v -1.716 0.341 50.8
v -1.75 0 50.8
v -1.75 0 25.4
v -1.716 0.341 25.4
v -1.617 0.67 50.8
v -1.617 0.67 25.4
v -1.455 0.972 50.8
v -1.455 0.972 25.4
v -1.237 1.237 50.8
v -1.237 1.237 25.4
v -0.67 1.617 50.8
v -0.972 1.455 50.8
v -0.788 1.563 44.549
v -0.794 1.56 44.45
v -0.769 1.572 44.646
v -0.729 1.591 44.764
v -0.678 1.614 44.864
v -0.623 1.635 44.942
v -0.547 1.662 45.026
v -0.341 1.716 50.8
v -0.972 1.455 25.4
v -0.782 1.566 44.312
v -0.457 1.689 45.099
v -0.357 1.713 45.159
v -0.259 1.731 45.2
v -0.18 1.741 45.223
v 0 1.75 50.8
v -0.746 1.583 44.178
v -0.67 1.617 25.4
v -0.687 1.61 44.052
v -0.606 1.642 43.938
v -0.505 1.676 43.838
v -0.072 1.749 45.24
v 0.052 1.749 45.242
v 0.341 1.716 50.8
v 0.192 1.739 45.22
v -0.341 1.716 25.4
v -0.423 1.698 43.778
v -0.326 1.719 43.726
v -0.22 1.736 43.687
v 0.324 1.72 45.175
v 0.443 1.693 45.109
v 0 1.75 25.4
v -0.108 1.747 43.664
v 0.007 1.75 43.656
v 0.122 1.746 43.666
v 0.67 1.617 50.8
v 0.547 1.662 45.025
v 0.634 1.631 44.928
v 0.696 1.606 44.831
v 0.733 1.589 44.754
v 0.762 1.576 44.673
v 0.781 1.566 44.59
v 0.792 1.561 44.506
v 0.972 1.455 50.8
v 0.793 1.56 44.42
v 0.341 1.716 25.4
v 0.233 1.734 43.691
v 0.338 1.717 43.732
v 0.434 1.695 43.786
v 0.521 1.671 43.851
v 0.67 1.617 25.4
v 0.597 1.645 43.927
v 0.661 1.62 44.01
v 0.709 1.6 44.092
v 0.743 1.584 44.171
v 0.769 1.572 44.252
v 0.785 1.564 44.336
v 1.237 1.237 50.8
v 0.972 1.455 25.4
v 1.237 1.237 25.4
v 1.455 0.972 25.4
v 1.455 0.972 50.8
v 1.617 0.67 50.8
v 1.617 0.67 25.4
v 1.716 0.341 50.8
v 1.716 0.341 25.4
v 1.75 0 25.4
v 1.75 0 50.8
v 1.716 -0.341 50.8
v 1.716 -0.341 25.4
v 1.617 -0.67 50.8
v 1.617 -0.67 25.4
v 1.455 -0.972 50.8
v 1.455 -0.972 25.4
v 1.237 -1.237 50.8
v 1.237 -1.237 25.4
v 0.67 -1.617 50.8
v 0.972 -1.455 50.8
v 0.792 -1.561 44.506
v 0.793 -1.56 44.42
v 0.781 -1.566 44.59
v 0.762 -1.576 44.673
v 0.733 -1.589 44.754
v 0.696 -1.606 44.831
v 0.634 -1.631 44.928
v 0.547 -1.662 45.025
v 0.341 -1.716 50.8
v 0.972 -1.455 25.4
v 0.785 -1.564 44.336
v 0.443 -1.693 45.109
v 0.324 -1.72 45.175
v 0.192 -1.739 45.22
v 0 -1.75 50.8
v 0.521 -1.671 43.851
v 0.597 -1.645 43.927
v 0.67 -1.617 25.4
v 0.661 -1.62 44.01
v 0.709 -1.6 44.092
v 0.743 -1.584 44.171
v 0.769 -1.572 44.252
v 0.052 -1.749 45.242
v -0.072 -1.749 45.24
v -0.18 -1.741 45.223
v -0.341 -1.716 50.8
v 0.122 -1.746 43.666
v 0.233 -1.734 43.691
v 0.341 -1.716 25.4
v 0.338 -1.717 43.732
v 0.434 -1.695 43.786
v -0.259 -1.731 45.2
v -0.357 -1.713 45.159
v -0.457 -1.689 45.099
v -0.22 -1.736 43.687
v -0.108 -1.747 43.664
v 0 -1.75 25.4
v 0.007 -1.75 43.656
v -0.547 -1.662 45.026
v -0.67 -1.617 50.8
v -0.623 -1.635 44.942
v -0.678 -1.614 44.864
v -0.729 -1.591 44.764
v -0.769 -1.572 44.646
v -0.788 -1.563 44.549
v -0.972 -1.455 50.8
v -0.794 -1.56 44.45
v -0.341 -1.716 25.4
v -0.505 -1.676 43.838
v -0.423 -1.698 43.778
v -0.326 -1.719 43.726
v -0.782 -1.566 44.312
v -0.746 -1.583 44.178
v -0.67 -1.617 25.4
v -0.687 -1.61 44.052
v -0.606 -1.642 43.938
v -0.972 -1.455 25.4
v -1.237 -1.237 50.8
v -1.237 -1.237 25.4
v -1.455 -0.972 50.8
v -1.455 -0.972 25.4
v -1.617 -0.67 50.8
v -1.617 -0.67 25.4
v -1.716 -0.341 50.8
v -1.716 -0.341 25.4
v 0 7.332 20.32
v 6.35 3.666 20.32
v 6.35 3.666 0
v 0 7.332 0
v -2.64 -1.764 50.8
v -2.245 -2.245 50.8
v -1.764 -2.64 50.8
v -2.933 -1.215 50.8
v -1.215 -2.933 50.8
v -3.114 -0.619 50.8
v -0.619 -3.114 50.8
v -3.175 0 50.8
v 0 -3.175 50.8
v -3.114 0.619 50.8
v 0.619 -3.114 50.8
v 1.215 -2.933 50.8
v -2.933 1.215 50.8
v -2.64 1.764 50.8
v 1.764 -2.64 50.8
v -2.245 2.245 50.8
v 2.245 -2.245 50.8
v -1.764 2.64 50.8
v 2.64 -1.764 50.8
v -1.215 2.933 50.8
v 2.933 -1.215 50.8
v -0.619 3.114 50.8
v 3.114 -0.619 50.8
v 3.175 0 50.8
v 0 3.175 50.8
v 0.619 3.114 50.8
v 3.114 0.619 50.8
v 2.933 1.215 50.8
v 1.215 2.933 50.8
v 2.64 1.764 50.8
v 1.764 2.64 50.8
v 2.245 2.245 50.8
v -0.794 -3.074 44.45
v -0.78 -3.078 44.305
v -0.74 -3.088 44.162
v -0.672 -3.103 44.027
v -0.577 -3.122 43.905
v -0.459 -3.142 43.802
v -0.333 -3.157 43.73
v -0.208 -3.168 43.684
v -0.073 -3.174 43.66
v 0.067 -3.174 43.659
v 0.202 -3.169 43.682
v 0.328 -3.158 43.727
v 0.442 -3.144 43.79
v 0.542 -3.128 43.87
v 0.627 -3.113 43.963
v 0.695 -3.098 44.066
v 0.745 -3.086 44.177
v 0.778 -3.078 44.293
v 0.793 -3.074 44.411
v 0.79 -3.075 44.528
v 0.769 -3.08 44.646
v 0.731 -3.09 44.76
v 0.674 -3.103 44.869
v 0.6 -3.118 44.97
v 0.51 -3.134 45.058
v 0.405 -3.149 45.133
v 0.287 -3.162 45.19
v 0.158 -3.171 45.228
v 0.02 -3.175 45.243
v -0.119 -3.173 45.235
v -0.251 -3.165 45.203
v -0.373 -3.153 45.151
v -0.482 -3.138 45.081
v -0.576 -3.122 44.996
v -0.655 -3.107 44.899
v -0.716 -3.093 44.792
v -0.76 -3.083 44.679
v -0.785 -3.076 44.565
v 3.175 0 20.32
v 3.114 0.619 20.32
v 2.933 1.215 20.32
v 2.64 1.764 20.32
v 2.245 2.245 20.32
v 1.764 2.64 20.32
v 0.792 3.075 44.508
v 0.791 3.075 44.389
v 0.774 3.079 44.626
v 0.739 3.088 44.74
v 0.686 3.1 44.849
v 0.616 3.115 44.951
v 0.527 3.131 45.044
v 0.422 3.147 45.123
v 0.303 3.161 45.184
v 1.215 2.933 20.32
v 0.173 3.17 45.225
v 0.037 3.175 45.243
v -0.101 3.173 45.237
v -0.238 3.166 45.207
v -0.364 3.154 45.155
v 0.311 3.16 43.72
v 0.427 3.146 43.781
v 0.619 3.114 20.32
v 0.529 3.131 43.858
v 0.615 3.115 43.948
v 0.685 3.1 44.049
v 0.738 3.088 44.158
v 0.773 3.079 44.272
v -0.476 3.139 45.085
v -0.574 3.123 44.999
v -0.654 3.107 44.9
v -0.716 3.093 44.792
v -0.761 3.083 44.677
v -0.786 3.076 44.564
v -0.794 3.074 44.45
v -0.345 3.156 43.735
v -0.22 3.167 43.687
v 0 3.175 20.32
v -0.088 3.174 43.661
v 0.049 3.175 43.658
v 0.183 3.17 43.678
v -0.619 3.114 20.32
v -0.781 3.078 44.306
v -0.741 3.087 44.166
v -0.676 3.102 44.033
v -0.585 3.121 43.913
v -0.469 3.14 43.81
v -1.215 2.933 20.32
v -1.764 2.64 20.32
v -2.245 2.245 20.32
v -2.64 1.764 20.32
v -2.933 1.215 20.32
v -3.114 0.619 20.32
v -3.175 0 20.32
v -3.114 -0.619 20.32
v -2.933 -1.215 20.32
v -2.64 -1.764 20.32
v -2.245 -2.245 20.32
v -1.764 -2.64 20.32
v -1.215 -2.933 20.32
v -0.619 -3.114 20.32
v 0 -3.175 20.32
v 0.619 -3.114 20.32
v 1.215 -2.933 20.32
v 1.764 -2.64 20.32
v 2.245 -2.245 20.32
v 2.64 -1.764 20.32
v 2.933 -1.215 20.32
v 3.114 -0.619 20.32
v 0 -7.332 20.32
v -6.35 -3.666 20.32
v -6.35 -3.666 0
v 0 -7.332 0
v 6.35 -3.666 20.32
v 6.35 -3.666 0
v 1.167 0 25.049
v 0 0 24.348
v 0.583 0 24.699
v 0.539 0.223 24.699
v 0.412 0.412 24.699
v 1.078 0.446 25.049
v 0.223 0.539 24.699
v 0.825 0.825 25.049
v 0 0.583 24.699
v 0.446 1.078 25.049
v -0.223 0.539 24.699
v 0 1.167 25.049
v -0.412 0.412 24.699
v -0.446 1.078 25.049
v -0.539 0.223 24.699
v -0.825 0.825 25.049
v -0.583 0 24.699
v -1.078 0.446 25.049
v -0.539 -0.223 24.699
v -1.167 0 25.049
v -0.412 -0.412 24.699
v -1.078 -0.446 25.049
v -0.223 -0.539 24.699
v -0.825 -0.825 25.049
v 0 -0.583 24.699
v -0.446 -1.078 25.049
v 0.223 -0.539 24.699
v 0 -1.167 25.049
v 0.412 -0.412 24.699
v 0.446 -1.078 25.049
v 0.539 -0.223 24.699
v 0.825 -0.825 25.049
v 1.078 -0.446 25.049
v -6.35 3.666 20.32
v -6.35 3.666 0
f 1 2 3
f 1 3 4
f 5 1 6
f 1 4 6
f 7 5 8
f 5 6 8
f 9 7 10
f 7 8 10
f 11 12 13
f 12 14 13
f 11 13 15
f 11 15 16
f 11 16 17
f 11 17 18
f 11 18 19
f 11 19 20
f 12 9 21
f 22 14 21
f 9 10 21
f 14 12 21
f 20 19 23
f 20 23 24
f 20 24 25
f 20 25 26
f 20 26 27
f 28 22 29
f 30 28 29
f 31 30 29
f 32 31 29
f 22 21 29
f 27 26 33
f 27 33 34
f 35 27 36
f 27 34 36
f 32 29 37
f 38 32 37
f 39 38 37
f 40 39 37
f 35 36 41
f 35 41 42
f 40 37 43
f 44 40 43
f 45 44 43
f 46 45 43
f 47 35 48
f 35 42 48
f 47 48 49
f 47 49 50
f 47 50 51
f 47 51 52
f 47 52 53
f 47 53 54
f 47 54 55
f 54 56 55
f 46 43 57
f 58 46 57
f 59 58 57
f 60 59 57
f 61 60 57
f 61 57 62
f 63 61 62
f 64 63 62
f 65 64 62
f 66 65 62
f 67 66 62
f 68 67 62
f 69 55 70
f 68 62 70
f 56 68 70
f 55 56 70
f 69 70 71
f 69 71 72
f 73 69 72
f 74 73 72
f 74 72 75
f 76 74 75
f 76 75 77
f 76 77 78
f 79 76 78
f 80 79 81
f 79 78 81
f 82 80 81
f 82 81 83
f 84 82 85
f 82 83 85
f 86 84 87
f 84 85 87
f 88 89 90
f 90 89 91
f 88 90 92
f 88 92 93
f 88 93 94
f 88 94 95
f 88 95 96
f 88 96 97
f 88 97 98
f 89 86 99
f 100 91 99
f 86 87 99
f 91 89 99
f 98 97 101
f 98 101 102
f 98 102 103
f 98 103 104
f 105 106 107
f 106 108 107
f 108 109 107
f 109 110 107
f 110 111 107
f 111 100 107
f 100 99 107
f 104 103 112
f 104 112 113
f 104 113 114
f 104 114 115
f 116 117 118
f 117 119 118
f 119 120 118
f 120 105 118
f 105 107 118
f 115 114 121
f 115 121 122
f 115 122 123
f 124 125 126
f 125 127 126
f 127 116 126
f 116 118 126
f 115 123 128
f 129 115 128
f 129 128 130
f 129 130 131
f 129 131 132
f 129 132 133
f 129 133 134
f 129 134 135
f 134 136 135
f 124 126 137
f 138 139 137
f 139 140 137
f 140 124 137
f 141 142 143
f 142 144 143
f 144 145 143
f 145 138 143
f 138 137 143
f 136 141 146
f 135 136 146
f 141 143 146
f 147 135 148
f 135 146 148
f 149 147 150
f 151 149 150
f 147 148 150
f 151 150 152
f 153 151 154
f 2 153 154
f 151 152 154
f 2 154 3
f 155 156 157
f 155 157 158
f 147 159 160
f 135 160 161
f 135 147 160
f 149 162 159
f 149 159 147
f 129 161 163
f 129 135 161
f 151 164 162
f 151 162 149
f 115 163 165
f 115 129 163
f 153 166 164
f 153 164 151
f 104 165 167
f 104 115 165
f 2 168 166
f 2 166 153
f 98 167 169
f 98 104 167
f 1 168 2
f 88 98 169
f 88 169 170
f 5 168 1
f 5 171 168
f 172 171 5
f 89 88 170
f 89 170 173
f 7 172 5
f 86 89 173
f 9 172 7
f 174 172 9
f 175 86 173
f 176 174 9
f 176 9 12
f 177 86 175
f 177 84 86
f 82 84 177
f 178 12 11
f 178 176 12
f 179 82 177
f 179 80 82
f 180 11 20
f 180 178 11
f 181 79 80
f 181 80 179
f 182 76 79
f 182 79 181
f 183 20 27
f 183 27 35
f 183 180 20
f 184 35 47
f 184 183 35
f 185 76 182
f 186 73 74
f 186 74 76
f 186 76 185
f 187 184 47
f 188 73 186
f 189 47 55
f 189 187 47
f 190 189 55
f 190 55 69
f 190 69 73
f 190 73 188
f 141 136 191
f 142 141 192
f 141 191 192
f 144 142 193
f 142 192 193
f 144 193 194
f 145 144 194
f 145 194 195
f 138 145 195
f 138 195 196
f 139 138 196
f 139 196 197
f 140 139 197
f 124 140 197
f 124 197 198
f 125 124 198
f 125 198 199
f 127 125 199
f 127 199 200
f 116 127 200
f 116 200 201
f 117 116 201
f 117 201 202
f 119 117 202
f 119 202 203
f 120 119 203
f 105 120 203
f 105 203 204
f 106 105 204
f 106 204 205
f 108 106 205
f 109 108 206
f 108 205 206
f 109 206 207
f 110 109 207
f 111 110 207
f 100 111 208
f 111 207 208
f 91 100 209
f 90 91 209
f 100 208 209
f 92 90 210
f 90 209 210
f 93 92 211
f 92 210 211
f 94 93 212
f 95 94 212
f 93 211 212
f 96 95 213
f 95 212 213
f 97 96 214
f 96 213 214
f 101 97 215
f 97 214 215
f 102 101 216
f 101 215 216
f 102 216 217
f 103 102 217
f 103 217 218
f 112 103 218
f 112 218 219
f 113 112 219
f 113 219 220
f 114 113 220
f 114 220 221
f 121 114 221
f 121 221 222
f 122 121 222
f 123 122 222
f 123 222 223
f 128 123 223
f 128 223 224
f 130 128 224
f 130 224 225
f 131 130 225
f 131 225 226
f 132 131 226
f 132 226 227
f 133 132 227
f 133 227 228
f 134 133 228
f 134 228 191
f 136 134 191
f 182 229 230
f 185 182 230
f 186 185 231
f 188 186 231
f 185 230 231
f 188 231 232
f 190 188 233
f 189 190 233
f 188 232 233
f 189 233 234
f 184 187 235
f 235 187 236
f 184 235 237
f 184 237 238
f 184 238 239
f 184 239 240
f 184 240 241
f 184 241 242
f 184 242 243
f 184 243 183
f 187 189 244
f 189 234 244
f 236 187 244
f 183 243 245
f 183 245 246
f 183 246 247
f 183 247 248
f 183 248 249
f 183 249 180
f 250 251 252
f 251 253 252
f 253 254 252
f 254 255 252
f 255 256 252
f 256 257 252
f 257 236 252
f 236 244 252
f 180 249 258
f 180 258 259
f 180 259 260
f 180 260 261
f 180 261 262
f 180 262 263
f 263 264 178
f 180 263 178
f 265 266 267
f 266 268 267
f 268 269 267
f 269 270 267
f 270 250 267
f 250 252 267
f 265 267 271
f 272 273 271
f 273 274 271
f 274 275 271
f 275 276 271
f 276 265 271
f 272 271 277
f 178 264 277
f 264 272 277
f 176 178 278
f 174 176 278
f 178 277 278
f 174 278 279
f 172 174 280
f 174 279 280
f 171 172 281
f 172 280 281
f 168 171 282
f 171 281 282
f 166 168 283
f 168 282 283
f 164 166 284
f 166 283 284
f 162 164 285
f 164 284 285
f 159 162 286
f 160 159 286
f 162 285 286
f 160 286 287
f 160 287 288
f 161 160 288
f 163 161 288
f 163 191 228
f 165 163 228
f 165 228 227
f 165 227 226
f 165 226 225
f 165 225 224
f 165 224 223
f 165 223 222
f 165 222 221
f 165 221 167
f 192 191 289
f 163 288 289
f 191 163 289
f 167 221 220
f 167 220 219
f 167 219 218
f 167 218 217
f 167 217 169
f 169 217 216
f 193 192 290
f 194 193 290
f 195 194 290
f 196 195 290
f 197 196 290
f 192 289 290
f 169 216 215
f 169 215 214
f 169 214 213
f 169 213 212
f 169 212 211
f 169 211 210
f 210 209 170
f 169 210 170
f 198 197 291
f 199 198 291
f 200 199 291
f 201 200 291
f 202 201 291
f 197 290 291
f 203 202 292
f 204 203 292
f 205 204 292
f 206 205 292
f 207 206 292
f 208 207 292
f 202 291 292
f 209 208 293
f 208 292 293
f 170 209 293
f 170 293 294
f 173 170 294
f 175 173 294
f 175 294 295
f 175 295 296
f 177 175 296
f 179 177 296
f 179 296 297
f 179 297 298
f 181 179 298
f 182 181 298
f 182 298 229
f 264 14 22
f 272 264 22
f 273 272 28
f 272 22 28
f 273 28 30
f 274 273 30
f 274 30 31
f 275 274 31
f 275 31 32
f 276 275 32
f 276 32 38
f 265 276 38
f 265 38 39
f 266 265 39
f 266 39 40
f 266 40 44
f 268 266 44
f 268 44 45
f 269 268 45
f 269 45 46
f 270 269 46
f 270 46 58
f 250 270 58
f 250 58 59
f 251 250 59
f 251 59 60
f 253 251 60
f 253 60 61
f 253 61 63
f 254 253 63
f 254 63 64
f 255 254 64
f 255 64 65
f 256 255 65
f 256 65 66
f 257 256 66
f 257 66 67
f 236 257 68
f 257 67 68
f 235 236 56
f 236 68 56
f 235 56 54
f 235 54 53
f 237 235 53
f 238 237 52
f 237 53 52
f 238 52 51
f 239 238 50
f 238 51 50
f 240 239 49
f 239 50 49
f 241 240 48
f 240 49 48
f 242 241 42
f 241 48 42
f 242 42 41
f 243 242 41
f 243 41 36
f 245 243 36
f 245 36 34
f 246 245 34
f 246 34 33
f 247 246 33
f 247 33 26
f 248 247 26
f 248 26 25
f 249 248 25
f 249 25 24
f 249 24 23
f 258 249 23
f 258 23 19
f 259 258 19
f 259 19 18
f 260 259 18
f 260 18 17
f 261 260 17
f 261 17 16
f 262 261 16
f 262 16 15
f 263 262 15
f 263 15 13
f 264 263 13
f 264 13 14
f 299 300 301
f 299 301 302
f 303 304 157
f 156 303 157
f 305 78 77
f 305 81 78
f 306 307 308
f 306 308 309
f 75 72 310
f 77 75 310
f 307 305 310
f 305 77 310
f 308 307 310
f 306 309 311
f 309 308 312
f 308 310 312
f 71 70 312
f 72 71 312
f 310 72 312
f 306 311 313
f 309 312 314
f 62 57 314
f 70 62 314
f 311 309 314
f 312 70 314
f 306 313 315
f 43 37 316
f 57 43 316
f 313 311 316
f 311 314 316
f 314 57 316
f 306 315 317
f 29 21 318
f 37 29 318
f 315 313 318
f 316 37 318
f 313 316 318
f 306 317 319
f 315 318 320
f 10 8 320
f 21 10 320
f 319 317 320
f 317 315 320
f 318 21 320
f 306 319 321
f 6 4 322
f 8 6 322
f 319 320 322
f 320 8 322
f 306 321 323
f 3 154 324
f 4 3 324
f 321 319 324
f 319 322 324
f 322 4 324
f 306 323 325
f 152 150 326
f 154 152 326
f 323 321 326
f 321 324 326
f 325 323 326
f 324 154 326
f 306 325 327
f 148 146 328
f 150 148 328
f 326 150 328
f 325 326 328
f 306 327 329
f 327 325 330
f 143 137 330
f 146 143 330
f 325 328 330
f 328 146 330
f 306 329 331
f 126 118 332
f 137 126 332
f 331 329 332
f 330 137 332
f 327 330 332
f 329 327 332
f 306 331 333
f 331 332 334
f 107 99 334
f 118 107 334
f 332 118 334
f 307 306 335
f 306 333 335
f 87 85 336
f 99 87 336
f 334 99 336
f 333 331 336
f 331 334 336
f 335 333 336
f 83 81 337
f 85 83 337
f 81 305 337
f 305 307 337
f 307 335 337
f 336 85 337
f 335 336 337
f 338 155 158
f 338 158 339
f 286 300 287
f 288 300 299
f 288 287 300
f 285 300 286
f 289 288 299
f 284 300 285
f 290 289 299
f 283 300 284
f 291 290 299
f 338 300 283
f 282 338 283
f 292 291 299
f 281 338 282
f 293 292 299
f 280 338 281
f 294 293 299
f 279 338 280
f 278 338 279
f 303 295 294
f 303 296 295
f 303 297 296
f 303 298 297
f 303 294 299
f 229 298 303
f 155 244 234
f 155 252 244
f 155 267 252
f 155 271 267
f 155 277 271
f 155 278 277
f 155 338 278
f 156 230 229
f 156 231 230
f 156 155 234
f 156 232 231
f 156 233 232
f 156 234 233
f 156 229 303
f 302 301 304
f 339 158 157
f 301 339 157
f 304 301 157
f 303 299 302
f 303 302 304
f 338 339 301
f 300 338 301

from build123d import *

# Parameters (mm, degrees)
BOSS_EXTRUDE1_DEPTH            = 20.32
SKETCH2_R                      = 3.175
BOSS_EXTRUDE2_DEPTH            = 30.48
F_3_5_3_5_DIAMETER_HOLE1_D     = 3.5
F_3_5_3_5_DIAMETER_HOLE1_DEPTH = 25.4
F_3_5_3_5_DIAMETER_HOLE1_TIP   = 1.051506083
F_1_16_0_0625_DIAMETER_HOLE1_D = 1.5875


with BuildPart() as part:
    # Sketch1 → Boss-Extrude1 (new body)
    with BuildSketch(Plane.XY):
        Polygon((0, 7.332348419), (-6.35, 3.666174209), (-6.35, -3.666174209), (0, -7.332348419), (6.35, -3.666174209), (6.35, 3.666174209), align=None)
    extrude(amount=BOSS_EXTRUDE1_DEPTH)

    # Sketch2 → Boss-Extrude2 (add)
    with BuildSketch(Plane.XY.offset(20.32)):
        Circle(SKETCH2_R)
    extrude(amount=BOSS_EXTRUDE2_DEPTH)

    # Ø3.5 (3.5) Diameter Hole1
    with Locations(Plane.XY.offset(50.8)):
        with Locations((0, 0)):
            Hole(F_3_5_3_5_DIAMETER_HOLE1_D / 2, depth=F_3_5_3_5_DIAMETER_HOLE1_DEPTH)
            with Locations((0, 0, -(F_3_5_3_5_DIAMETER_HOLE1_DEPTH + F_3_5_3_5_DIAMETER_HOLE1_TIP / 2))):  # 118° drill point
                Cone(0, F_3_5_3_5_DIAMETER_HOLE1_D / 2, F_3_5_3_5_DIAMETER_HOLE1_TIP, mode=Mode.SUBTRACT)

    # 1/16 (0.0625) Diameter Hole1 (through all)
    with Locations(Plane(origin=(0, 7.62, 0), x_dir=(1, 0, 0), z_dir=(0, 1, 0))):
        with Locations((0, -44.45)):
            Hole(F_1_16_0_0625_DIAMETER_HOLE1_D / 2)


solid = part.part
